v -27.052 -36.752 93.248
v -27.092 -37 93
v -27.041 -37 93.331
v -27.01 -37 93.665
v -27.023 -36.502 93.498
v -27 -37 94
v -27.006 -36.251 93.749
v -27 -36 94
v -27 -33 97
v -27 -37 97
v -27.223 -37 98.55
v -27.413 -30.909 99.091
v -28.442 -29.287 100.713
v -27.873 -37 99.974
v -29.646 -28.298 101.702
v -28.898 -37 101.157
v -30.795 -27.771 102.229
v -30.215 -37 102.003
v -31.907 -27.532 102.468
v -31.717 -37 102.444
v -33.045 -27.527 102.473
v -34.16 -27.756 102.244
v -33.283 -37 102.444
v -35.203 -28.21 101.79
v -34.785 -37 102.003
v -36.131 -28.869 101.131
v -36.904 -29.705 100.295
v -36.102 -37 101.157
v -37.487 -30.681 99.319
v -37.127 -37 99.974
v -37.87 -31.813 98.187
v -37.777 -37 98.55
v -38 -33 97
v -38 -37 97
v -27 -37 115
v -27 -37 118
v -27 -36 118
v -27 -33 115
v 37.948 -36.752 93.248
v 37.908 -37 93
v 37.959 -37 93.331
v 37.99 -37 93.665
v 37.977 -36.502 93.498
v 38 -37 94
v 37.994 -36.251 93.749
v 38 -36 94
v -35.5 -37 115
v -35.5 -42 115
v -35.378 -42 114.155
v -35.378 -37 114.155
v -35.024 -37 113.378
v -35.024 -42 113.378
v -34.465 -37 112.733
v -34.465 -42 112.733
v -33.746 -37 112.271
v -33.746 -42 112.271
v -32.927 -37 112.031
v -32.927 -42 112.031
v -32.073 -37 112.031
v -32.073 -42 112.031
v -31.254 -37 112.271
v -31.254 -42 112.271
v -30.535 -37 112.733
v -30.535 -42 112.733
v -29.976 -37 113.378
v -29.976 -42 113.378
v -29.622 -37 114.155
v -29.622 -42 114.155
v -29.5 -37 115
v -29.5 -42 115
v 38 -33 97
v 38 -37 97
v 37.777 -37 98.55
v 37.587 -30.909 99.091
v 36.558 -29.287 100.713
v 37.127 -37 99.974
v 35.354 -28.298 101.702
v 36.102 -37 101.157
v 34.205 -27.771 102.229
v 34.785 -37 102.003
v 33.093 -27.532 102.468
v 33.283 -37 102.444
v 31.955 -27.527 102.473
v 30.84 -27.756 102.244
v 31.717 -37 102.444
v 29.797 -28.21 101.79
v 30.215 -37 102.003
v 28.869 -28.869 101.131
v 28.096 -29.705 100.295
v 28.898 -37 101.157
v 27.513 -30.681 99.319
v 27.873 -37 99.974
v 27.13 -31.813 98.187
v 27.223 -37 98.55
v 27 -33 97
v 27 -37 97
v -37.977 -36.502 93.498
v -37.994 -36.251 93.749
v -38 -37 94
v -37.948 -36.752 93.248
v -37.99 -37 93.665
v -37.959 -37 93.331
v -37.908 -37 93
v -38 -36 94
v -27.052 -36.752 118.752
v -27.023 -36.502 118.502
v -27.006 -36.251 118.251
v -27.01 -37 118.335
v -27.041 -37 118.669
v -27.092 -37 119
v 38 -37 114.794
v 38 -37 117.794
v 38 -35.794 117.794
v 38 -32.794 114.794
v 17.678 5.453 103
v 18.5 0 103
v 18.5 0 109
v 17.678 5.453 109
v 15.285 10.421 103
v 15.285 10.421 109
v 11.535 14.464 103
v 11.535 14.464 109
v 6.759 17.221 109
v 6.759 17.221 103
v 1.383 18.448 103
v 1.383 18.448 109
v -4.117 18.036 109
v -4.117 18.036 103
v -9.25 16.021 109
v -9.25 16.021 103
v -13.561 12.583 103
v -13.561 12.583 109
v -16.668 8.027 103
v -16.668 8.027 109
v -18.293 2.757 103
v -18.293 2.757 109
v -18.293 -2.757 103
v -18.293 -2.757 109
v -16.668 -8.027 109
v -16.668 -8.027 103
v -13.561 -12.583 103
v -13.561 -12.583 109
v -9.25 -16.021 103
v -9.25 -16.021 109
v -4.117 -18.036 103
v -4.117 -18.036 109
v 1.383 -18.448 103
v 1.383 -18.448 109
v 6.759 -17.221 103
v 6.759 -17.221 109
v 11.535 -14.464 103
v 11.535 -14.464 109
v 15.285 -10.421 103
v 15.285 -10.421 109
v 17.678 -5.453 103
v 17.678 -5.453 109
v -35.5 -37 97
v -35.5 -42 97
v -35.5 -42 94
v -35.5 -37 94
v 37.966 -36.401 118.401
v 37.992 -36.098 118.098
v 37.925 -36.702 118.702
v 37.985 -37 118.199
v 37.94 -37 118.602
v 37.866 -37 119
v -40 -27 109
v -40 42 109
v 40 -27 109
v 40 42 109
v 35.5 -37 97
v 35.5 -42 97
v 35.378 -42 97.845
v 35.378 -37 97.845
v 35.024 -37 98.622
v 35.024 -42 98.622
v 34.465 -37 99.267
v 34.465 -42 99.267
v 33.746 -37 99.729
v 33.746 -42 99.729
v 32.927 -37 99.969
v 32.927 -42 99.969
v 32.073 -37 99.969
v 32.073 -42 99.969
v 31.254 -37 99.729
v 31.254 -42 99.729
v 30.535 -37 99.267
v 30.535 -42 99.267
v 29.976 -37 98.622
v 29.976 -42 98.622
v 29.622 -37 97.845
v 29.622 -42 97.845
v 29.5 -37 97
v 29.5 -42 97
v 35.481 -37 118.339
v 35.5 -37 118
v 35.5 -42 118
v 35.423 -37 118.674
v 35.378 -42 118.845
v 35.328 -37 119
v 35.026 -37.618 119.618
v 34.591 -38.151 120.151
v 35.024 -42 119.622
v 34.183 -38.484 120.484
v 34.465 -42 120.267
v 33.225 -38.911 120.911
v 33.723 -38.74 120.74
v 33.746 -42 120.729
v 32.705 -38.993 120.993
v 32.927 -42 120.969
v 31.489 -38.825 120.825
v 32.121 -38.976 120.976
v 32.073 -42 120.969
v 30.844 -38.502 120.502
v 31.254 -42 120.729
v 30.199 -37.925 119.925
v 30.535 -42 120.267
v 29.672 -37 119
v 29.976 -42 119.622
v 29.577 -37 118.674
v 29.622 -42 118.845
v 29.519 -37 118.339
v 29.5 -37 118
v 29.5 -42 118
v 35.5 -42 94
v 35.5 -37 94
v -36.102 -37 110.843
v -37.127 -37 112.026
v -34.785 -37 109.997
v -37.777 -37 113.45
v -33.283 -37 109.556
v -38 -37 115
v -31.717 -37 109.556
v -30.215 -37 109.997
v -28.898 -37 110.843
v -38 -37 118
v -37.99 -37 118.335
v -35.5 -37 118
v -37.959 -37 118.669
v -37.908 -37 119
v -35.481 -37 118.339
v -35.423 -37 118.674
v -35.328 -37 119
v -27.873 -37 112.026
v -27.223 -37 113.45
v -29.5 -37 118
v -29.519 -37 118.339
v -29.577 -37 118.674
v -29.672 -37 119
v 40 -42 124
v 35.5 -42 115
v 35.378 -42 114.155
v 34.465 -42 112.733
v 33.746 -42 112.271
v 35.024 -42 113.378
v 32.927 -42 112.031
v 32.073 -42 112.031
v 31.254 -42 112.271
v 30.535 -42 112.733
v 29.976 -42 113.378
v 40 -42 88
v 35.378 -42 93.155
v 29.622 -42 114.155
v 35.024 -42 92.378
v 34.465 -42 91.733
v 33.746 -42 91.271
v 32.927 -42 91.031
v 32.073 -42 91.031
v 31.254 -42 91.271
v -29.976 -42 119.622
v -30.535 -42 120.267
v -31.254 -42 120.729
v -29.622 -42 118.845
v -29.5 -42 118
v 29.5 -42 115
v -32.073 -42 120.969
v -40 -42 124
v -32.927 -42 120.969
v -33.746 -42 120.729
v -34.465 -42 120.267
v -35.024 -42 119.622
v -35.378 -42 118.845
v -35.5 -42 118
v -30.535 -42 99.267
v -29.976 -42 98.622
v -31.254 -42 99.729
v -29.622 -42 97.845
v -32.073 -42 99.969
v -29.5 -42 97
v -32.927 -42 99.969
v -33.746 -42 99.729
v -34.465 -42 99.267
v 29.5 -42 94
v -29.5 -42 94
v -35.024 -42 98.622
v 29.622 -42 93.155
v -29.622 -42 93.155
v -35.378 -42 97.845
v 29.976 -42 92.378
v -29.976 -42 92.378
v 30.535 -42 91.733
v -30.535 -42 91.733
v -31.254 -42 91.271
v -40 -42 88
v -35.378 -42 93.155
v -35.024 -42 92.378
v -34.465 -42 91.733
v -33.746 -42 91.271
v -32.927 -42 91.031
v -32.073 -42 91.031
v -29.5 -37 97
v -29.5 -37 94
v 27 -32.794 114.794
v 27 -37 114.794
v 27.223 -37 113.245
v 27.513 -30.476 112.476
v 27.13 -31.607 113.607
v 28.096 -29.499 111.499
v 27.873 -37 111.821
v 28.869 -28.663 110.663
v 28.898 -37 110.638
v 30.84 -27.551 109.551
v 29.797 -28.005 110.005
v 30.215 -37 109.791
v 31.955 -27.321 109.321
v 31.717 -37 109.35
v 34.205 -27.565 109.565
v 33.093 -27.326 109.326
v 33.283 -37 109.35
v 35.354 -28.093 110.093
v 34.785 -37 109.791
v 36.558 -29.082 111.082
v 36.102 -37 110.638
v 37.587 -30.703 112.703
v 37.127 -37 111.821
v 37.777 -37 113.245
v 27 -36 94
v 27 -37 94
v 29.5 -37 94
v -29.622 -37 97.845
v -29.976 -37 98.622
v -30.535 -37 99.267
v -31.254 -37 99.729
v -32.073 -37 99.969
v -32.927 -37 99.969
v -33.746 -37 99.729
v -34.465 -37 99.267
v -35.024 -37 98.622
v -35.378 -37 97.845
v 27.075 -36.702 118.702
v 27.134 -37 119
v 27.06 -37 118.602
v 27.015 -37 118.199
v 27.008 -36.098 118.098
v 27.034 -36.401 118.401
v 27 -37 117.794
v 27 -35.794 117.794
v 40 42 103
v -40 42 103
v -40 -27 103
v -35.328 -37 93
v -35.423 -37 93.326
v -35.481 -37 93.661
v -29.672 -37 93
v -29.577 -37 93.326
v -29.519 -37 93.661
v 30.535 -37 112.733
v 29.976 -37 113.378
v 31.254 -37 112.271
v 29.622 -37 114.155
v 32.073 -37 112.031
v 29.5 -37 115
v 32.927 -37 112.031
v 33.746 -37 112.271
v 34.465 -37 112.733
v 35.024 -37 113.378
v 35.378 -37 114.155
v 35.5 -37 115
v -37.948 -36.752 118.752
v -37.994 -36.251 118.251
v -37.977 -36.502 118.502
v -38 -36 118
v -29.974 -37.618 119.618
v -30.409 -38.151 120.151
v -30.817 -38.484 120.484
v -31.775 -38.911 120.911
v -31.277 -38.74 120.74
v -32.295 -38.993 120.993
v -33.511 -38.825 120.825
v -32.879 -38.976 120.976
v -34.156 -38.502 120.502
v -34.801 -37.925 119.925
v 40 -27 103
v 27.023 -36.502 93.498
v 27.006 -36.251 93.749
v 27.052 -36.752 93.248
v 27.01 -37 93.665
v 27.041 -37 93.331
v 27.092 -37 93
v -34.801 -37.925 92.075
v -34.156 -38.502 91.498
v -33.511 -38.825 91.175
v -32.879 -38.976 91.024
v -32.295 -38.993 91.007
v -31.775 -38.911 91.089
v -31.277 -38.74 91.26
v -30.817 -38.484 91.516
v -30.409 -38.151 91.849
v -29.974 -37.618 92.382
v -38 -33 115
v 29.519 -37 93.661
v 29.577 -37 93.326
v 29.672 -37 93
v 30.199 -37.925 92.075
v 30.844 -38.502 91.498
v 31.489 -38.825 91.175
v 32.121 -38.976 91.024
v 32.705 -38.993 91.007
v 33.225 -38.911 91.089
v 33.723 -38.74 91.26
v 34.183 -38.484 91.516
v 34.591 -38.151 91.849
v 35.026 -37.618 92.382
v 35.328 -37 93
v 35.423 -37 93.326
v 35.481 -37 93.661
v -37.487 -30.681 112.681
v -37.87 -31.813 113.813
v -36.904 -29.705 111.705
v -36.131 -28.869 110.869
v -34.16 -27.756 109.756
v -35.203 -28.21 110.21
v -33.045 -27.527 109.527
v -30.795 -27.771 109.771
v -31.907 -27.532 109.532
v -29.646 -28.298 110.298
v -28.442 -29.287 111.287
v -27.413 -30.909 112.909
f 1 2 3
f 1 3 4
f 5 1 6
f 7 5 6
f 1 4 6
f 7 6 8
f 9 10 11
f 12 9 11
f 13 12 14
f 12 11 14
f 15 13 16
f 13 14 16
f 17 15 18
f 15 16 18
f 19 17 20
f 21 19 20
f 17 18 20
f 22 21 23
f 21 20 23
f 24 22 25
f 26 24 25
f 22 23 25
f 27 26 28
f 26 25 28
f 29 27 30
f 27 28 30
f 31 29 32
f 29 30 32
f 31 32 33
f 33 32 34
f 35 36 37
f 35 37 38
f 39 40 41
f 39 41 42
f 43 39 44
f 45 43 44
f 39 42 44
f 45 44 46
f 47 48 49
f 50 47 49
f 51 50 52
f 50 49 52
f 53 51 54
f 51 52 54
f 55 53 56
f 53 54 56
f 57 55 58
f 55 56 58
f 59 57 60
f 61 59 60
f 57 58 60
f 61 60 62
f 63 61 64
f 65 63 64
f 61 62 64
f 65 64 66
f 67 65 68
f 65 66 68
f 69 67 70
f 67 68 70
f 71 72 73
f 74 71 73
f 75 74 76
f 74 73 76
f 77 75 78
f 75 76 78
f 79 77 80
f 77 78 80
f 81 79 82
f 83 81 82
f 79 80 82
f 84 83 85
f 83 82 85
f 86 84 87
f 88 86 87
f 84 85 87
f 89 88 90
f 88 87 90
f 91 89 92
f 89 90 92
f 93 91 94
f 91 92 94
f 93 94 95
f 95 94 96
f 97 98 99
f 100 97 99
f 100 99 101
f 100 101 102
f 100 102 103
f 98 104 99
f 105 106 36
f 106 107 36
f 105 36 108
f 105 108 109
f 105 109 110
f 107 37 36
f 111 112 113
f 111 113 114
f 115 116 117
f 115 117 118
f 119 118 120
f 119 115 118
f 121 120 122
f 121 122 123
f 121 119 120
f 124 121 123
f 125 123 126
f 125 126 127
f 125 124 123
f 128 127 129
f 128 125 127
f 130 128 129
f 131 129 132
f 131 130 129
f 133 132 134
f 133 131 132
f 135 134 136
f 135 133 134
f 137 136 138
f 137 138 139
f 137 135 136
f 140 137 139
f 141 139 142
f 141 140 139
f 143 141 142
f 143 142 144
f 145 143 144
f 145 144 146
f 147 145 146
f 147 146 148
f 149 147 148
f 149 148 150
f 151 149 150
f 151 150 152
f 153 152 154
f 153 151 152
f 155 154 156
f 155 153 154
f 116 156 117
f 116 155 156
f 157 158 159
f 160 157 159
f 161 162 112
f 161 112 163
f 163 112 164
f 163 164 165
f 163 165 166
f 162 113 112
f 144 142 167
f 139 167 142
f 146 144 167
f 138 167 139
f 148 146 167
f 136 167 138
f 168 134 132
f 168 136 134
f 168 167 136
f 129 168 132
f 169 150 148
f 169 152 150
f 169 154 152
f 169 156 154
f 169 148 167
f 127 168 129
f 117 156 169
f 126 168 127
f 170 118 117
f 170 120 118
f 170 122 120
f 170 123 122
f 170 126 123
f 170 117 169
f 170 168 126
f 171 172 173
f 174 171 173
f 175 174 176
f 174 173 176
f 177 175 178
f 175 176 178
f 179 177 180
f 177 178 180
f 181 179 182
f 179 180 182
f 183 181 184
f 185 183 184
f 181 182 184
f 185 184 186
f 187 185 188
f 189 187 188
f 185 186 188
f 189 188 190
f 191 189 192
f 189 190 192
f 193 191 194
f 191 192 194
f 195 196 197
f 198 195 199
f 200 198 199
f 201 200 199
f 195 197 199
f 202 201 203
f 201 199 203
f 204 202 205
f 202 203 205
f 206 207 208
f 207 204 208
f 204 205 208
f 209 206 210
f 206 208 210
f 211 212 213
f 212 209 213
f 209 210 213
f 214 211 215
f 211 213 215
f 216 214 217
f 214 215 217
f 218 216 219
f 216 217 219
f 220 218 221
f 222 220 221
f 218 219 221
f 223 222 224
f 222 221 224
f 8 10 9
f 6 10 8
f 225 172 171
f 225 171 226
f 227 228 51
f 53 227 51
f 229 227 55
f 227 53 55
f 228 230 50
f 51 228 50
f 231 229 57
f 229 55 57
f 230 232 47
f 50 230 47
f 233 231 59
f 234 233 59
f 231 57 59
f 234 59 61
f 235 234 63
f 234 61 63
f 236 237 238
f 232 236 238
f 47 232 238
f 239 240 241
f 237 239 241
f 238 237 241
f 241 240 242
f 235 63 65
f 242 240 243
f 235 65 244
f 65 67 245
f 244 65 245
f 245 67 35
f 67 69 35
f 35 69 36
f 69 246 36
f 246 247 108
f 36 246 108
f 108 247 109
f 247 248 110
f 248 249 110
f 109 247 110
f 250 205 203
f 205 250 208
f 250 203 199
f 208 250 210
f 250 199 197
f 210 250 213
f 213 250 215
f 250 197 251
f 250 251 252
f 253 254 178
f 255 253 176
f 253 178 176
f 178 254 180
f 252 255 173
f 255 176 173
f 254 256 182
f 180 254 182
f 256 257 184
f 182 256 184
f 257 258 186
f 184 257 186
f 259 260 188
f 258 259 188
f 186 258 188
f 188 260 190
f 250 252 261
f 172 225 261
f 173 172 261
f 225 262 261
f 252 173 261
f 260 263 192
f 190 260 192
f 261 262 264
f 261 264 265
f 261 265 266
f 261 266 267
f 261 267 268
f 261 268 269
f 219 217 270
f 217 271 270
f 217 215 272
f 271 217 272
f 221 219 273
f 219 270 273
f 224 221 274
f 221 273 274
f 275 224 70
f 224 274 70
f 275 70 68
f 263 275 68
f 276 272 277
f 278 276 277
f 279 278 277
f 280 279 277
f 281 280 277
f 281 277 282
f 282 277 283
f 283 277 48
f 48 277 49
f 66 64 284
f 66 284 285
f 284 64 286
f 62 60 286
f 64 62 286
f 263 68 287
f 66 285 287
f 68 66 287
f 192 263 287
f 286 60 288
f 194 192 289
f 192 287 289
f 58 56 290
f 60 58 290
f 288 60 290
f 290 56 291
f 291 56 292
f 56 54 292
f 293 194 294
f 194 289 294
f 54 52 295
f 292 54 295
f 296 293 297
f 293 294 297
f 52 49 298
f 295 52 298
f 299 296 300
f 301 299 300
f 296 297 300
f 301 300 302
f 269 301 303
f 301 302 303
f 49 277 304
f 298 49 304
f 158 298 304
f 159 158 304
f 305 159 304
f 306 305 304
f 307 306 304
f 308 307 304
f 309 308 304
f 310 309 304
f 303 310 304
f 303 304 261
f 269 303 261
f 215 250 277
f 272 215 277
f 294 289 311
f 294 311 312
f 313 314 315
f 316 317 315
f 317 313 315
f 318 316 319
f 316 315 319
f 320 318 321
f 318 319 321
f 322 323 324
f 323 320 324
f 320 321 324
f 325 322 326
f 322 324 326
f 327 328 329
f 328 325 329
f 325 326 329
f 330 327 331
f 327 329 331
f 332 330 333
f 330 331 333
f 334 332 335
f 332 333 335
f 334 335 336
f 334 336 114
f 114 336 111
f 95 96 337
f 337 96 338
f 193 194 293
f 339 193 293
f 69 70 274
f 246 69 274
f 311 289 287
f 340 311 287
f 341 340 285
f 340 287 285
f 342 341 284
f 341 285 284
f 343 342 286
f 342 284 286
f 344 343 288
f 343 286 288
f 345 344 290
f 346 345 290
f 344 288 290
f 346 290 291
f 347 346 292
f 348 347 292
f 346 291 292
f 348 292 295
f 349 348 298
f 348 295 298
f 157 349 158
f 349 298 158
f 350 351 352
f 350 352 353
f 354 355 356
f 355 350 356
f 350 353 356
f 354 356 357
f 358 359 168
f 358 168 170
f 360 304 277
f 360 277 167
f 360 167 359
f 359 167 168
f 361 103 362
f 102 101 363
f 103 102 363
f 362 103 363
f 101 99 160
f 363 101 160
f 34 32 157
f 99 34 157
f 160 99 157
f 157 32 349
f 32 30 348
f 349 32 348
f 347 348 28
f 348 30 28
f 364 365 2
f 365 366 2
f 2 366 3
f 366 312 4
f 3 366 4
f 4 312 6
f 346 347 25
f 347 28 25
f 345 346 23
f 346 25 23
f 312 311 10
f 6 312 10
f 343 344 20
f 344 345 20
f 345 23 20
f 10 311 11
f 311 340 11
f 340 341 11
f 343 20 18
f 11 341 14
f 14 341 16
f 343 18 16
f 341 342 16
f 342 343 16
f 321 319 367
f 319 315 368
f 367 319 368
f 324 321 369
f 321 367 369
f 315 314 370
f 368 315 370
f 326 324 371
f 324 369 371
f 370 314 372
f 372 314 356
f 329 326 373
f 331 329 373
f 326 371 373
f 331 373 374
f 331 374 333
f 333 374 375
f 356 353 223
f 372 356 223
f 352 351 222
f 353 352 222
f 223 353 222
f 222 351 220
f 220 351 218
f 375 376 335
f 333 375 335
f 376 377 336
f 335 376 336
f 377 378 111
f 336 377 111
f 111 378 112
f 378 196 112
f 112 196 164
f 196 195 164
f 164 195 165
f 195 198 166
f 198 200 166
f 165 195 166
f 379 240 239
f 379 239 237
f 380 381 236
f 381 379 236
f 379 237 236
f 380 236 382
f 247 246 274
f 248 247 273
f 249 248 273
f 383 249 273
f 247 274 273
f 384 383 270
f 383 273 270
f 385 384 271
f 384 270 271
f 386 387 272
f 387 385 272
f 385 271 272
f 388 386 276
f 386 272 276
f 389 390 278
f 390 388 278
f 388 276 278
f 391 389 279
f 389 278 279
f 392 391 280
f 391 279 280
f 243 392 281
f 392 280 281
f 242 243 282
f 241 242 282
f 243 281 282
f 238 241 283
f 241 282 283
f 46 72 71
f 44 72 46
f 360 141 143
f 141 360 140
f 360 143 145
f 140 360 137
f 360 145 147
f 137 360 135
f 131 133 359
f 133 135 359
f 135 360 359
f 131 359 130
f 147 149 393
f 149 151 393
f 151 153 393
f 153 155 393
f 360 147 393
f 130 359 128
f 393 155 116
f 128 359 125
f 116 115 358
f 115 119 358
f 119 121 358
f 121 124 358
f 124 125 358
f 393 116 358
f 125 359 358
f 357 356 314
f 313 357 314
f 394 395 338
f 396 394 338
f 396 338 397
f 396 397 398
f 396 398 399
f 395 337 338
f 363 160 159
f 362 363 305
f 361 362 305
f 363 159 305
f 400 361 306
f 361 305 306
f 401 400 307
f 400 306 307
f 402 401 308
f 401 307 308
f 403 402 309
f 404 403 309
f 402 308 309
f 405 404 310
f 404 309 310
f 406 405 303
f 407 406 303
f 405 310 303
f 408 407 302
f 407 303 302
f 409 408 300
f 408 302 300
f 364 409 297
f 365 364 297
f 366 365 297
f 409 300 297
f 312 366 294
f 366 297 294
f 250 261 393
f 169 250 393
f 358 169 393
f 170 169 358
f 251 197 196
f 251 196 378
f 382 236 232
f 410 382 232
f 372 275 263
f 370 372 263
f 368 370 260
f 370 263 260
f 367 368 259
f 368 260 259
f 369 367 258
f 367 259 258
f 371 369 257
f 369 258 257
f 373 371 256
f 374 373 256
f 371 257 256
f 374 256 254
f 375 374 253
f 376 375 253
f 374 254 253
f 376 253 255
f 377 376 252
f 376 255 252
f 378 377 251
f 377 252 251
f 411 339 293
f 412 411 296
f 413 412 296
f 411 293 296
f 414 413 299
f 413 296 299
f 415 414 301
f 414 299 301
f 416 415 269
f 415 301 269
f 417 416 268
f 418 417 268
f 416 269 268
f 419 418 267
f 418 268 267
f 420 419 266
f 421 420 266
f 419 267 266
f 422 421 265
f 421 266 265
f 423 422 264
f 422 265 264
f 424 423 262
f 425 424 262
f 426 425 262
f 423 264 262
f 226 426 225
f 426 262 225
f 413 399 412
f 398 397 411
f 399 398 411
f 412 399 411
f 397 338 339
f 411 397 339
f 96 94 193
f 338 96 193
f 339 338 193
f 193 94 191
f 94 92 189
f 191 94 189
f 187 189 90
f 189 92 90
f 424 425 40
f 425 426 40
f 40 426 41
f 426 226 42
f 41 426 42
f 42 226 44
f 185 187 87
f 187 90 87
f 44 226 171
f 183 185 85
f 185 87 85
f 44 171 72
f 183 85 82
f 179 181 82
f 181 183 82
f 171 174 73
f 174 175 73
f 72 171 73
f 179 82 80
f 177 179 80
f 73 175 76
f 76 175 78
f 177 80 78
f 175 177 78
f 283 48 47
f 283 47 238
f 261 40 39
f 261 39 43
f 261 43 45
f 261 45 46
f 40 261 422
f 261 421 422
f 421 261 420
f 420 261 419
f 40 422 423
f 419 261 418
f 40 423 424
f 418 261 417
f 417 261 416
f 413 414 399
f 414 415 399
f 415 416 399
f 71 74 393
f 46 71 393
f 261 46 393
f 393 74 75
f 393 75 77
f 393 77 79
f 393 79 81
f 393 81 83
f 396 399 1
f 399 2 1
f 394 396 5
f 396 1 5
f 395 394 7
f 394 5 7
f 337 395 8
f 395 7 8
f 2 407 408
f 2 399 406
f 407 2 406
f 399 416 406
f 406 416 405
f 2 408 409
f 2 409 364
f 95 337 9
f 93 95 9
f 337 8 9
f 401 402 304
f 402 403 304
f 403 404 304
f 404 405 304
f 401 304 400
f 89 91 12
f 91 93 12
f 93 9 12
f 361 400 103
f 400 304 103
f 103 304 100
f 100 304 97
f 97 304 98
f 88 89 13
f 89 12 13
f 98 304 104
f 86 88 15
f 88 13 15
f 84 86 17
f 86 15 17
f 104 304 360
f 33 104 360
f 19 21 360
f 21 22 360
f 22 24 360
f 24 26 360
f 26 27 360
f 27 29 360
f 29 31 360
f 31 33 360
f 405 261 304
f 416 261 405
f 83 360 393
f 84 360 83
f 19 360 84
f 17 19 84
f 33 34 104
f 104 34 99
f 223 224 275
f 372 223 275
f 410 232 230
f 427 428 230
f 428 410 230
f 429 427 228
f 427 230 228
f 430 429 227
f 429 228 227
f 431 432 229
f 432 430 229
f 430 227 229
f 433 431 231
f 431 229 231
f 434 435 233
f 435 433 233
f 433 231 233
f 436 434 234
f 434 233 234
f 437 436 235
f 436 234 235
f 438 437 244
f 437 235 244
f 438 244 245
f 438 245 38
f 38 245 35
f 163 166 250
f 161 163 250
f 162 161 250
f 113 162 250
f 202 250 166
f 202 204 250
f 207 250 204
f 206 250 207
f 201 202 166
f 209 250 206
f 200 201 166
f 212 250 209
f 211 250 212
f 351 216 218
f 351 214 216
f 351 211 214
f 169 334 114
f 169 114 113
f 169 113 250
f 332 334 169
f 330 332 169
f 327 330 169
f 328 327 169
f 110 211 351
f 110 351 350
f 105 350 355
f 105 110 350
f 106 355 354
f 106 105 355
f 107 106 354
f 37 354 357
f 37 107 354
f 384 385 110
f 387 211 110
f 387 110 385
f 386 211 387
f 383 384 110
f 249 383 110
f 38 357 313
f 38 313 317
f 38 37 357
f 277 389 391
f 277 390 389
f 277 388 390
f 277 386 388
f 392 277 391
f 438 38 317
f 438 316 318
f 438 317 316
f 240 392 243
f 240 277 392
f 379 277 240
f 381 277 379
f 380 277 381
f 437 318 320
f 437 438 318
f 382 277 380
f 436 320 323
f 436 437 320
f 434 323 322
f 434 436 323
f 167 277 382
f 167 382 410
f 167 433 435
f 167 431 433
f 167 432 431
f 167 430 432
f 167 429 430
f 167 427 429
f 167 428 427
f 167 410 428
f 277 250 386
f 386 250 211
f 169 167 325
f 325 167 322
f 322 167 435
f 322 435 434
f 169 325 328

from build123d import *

# Parameters (mm, degrees)
SKETCH071_W     = 80
SKETCH071_H     = 84
SKETCH071_R     = 18.5
PAD029_DEPTH    = 6
PAD030_DEPTH    = 80
POCKET027_DEPTH = 84.001
POCKET028_DEPTH = 79.001


with BuildPart() as part:
    # Sketch071 → Pad029 (new body)
    with BuildSketch(Plane.XY):
        Rectangle(SKETCH071_W, SKETCH071_H)
        Circle(SKETCH071_R, mode=Mode.SUBTRACT)
    extrude(amount=PAD029_DEPTH)

    # Sketch072 (on Face3 of Pad029) → Pad030 (join)
    with BuildSketch(Plane(origin=(-40, 0, 0), x_dir=(0, -1, 0), z_dir=(-1, 0, 0))):
        Polygon((27, 0), (42, 0), (42, -15), align=None)
        Polygon((27, 6), (42, 6), (42, 21), align=None)
    extrude(amount=-PAD030_DEPTH)

    # Sketch073 (on Face8 of Pad030) → Pocket027 (cut, through all)
    with BuildSketch(Plane.XZ.offset(42)):
        with BuildLine():
            ThreePointArc((-35.5, 12), (-32.5, 9), (-29.5, 12))
            Line((-29.5, 12), (-29.5, 15))
            ThreePointArc((-29.5, 15), (-32.5, 18), (-35.5, 15))
            Line((-35.5, 12), (-35.5, 15))
        make_face()
        with BuildLine():
            ThreePointArc((35.5, 15), (32.5, 18), (29.5, 15))
            Line((29.5, 15), (29.5, 12))
            ThreePointArc((29.5, 12), (32.5, 9), (35.5, 12))
            Line((35.5, 15), (35.5, 12))
        make_face()
        with BuildLine():
            ThreePointArc((-29.5, -6), (-32.5, -3), (-35.5, -6))
            Line((-35.5, -6), (-35.5, -9))
            ThreePointArc((-35.5, -9), (-32.5, -12), (-29.5, -9))
            Line((-29.5, -6), (-29.5, -9))
        make_face()
        with BuildLine():
            ThreePointArc((35.5, -6), (32.5, -3), (29.5, -6))
            Line((29.5, -6), (29.5, -9))
            ThreePointArc((29.5, -9), (32.5, -12), (35.5, -9))
            Line((35.5, -6), (35.5, -9))
        make_face()
    extrude(amount=-POCKET027_DEPTH, mode=Mode.SUBTRACT)

    # Sketch074 (on Face8 of Pocket027) → Pocket028 (cut, through all)
    with BuildSketch(Plane.XZ.offset(37)):
        with BuildLine():
            ThreePointArc((-27, 15), (-32.5, 20.5), (-38, 15))
            Line((-38, 15), (-38, 12))
            ThreePointArc((-38, 12), (-32.5, 6.5), (-27, 12))
            Line((-27, 15), (-27, 12))
        make_face()
        with BuildLine():
            ThreePointArc((38, 14.79435), (32.5, 20.29435), (27, 14.79435))
            Line((27, 14.79435), (27, 11.79435))
            ThreePointArc((27, 11.79435), (32.5, 6.29435), (38, 11.79435))
            Line((38, 14.79435), (38, 11.79435))
        make_face()
        with BuildLine():
            ThreePointArc((38, -6), (32.5, -0.5), (27, -6))
            Line((27, -6), (27, -9))
            ThreePointArc((27, -9), (32.5, -14.5), (38, -9))
            Line((38, -6), (38, -9))
        make_face()
        with BuildLine():
            ThreePointArc((-27, -6), (-32.5, -0.5), (-38, -6))
            Line((-38, -6), (-38, -9))
            ThreePointArc((-38, -9), (-32.5, -14.5), (-27, -9))
            Line((-27, -6), (-27, -9))
        make_face()
    extrude(amount=-POCKET028_DEPTH, mode=Mode.SUBTRACT)


with BuildPart() as part_1:
    # Body007 placement: moved
    add(part.part.moved(Location((0, -1.2e-05, 103.000008))))


solid = part_1.part
